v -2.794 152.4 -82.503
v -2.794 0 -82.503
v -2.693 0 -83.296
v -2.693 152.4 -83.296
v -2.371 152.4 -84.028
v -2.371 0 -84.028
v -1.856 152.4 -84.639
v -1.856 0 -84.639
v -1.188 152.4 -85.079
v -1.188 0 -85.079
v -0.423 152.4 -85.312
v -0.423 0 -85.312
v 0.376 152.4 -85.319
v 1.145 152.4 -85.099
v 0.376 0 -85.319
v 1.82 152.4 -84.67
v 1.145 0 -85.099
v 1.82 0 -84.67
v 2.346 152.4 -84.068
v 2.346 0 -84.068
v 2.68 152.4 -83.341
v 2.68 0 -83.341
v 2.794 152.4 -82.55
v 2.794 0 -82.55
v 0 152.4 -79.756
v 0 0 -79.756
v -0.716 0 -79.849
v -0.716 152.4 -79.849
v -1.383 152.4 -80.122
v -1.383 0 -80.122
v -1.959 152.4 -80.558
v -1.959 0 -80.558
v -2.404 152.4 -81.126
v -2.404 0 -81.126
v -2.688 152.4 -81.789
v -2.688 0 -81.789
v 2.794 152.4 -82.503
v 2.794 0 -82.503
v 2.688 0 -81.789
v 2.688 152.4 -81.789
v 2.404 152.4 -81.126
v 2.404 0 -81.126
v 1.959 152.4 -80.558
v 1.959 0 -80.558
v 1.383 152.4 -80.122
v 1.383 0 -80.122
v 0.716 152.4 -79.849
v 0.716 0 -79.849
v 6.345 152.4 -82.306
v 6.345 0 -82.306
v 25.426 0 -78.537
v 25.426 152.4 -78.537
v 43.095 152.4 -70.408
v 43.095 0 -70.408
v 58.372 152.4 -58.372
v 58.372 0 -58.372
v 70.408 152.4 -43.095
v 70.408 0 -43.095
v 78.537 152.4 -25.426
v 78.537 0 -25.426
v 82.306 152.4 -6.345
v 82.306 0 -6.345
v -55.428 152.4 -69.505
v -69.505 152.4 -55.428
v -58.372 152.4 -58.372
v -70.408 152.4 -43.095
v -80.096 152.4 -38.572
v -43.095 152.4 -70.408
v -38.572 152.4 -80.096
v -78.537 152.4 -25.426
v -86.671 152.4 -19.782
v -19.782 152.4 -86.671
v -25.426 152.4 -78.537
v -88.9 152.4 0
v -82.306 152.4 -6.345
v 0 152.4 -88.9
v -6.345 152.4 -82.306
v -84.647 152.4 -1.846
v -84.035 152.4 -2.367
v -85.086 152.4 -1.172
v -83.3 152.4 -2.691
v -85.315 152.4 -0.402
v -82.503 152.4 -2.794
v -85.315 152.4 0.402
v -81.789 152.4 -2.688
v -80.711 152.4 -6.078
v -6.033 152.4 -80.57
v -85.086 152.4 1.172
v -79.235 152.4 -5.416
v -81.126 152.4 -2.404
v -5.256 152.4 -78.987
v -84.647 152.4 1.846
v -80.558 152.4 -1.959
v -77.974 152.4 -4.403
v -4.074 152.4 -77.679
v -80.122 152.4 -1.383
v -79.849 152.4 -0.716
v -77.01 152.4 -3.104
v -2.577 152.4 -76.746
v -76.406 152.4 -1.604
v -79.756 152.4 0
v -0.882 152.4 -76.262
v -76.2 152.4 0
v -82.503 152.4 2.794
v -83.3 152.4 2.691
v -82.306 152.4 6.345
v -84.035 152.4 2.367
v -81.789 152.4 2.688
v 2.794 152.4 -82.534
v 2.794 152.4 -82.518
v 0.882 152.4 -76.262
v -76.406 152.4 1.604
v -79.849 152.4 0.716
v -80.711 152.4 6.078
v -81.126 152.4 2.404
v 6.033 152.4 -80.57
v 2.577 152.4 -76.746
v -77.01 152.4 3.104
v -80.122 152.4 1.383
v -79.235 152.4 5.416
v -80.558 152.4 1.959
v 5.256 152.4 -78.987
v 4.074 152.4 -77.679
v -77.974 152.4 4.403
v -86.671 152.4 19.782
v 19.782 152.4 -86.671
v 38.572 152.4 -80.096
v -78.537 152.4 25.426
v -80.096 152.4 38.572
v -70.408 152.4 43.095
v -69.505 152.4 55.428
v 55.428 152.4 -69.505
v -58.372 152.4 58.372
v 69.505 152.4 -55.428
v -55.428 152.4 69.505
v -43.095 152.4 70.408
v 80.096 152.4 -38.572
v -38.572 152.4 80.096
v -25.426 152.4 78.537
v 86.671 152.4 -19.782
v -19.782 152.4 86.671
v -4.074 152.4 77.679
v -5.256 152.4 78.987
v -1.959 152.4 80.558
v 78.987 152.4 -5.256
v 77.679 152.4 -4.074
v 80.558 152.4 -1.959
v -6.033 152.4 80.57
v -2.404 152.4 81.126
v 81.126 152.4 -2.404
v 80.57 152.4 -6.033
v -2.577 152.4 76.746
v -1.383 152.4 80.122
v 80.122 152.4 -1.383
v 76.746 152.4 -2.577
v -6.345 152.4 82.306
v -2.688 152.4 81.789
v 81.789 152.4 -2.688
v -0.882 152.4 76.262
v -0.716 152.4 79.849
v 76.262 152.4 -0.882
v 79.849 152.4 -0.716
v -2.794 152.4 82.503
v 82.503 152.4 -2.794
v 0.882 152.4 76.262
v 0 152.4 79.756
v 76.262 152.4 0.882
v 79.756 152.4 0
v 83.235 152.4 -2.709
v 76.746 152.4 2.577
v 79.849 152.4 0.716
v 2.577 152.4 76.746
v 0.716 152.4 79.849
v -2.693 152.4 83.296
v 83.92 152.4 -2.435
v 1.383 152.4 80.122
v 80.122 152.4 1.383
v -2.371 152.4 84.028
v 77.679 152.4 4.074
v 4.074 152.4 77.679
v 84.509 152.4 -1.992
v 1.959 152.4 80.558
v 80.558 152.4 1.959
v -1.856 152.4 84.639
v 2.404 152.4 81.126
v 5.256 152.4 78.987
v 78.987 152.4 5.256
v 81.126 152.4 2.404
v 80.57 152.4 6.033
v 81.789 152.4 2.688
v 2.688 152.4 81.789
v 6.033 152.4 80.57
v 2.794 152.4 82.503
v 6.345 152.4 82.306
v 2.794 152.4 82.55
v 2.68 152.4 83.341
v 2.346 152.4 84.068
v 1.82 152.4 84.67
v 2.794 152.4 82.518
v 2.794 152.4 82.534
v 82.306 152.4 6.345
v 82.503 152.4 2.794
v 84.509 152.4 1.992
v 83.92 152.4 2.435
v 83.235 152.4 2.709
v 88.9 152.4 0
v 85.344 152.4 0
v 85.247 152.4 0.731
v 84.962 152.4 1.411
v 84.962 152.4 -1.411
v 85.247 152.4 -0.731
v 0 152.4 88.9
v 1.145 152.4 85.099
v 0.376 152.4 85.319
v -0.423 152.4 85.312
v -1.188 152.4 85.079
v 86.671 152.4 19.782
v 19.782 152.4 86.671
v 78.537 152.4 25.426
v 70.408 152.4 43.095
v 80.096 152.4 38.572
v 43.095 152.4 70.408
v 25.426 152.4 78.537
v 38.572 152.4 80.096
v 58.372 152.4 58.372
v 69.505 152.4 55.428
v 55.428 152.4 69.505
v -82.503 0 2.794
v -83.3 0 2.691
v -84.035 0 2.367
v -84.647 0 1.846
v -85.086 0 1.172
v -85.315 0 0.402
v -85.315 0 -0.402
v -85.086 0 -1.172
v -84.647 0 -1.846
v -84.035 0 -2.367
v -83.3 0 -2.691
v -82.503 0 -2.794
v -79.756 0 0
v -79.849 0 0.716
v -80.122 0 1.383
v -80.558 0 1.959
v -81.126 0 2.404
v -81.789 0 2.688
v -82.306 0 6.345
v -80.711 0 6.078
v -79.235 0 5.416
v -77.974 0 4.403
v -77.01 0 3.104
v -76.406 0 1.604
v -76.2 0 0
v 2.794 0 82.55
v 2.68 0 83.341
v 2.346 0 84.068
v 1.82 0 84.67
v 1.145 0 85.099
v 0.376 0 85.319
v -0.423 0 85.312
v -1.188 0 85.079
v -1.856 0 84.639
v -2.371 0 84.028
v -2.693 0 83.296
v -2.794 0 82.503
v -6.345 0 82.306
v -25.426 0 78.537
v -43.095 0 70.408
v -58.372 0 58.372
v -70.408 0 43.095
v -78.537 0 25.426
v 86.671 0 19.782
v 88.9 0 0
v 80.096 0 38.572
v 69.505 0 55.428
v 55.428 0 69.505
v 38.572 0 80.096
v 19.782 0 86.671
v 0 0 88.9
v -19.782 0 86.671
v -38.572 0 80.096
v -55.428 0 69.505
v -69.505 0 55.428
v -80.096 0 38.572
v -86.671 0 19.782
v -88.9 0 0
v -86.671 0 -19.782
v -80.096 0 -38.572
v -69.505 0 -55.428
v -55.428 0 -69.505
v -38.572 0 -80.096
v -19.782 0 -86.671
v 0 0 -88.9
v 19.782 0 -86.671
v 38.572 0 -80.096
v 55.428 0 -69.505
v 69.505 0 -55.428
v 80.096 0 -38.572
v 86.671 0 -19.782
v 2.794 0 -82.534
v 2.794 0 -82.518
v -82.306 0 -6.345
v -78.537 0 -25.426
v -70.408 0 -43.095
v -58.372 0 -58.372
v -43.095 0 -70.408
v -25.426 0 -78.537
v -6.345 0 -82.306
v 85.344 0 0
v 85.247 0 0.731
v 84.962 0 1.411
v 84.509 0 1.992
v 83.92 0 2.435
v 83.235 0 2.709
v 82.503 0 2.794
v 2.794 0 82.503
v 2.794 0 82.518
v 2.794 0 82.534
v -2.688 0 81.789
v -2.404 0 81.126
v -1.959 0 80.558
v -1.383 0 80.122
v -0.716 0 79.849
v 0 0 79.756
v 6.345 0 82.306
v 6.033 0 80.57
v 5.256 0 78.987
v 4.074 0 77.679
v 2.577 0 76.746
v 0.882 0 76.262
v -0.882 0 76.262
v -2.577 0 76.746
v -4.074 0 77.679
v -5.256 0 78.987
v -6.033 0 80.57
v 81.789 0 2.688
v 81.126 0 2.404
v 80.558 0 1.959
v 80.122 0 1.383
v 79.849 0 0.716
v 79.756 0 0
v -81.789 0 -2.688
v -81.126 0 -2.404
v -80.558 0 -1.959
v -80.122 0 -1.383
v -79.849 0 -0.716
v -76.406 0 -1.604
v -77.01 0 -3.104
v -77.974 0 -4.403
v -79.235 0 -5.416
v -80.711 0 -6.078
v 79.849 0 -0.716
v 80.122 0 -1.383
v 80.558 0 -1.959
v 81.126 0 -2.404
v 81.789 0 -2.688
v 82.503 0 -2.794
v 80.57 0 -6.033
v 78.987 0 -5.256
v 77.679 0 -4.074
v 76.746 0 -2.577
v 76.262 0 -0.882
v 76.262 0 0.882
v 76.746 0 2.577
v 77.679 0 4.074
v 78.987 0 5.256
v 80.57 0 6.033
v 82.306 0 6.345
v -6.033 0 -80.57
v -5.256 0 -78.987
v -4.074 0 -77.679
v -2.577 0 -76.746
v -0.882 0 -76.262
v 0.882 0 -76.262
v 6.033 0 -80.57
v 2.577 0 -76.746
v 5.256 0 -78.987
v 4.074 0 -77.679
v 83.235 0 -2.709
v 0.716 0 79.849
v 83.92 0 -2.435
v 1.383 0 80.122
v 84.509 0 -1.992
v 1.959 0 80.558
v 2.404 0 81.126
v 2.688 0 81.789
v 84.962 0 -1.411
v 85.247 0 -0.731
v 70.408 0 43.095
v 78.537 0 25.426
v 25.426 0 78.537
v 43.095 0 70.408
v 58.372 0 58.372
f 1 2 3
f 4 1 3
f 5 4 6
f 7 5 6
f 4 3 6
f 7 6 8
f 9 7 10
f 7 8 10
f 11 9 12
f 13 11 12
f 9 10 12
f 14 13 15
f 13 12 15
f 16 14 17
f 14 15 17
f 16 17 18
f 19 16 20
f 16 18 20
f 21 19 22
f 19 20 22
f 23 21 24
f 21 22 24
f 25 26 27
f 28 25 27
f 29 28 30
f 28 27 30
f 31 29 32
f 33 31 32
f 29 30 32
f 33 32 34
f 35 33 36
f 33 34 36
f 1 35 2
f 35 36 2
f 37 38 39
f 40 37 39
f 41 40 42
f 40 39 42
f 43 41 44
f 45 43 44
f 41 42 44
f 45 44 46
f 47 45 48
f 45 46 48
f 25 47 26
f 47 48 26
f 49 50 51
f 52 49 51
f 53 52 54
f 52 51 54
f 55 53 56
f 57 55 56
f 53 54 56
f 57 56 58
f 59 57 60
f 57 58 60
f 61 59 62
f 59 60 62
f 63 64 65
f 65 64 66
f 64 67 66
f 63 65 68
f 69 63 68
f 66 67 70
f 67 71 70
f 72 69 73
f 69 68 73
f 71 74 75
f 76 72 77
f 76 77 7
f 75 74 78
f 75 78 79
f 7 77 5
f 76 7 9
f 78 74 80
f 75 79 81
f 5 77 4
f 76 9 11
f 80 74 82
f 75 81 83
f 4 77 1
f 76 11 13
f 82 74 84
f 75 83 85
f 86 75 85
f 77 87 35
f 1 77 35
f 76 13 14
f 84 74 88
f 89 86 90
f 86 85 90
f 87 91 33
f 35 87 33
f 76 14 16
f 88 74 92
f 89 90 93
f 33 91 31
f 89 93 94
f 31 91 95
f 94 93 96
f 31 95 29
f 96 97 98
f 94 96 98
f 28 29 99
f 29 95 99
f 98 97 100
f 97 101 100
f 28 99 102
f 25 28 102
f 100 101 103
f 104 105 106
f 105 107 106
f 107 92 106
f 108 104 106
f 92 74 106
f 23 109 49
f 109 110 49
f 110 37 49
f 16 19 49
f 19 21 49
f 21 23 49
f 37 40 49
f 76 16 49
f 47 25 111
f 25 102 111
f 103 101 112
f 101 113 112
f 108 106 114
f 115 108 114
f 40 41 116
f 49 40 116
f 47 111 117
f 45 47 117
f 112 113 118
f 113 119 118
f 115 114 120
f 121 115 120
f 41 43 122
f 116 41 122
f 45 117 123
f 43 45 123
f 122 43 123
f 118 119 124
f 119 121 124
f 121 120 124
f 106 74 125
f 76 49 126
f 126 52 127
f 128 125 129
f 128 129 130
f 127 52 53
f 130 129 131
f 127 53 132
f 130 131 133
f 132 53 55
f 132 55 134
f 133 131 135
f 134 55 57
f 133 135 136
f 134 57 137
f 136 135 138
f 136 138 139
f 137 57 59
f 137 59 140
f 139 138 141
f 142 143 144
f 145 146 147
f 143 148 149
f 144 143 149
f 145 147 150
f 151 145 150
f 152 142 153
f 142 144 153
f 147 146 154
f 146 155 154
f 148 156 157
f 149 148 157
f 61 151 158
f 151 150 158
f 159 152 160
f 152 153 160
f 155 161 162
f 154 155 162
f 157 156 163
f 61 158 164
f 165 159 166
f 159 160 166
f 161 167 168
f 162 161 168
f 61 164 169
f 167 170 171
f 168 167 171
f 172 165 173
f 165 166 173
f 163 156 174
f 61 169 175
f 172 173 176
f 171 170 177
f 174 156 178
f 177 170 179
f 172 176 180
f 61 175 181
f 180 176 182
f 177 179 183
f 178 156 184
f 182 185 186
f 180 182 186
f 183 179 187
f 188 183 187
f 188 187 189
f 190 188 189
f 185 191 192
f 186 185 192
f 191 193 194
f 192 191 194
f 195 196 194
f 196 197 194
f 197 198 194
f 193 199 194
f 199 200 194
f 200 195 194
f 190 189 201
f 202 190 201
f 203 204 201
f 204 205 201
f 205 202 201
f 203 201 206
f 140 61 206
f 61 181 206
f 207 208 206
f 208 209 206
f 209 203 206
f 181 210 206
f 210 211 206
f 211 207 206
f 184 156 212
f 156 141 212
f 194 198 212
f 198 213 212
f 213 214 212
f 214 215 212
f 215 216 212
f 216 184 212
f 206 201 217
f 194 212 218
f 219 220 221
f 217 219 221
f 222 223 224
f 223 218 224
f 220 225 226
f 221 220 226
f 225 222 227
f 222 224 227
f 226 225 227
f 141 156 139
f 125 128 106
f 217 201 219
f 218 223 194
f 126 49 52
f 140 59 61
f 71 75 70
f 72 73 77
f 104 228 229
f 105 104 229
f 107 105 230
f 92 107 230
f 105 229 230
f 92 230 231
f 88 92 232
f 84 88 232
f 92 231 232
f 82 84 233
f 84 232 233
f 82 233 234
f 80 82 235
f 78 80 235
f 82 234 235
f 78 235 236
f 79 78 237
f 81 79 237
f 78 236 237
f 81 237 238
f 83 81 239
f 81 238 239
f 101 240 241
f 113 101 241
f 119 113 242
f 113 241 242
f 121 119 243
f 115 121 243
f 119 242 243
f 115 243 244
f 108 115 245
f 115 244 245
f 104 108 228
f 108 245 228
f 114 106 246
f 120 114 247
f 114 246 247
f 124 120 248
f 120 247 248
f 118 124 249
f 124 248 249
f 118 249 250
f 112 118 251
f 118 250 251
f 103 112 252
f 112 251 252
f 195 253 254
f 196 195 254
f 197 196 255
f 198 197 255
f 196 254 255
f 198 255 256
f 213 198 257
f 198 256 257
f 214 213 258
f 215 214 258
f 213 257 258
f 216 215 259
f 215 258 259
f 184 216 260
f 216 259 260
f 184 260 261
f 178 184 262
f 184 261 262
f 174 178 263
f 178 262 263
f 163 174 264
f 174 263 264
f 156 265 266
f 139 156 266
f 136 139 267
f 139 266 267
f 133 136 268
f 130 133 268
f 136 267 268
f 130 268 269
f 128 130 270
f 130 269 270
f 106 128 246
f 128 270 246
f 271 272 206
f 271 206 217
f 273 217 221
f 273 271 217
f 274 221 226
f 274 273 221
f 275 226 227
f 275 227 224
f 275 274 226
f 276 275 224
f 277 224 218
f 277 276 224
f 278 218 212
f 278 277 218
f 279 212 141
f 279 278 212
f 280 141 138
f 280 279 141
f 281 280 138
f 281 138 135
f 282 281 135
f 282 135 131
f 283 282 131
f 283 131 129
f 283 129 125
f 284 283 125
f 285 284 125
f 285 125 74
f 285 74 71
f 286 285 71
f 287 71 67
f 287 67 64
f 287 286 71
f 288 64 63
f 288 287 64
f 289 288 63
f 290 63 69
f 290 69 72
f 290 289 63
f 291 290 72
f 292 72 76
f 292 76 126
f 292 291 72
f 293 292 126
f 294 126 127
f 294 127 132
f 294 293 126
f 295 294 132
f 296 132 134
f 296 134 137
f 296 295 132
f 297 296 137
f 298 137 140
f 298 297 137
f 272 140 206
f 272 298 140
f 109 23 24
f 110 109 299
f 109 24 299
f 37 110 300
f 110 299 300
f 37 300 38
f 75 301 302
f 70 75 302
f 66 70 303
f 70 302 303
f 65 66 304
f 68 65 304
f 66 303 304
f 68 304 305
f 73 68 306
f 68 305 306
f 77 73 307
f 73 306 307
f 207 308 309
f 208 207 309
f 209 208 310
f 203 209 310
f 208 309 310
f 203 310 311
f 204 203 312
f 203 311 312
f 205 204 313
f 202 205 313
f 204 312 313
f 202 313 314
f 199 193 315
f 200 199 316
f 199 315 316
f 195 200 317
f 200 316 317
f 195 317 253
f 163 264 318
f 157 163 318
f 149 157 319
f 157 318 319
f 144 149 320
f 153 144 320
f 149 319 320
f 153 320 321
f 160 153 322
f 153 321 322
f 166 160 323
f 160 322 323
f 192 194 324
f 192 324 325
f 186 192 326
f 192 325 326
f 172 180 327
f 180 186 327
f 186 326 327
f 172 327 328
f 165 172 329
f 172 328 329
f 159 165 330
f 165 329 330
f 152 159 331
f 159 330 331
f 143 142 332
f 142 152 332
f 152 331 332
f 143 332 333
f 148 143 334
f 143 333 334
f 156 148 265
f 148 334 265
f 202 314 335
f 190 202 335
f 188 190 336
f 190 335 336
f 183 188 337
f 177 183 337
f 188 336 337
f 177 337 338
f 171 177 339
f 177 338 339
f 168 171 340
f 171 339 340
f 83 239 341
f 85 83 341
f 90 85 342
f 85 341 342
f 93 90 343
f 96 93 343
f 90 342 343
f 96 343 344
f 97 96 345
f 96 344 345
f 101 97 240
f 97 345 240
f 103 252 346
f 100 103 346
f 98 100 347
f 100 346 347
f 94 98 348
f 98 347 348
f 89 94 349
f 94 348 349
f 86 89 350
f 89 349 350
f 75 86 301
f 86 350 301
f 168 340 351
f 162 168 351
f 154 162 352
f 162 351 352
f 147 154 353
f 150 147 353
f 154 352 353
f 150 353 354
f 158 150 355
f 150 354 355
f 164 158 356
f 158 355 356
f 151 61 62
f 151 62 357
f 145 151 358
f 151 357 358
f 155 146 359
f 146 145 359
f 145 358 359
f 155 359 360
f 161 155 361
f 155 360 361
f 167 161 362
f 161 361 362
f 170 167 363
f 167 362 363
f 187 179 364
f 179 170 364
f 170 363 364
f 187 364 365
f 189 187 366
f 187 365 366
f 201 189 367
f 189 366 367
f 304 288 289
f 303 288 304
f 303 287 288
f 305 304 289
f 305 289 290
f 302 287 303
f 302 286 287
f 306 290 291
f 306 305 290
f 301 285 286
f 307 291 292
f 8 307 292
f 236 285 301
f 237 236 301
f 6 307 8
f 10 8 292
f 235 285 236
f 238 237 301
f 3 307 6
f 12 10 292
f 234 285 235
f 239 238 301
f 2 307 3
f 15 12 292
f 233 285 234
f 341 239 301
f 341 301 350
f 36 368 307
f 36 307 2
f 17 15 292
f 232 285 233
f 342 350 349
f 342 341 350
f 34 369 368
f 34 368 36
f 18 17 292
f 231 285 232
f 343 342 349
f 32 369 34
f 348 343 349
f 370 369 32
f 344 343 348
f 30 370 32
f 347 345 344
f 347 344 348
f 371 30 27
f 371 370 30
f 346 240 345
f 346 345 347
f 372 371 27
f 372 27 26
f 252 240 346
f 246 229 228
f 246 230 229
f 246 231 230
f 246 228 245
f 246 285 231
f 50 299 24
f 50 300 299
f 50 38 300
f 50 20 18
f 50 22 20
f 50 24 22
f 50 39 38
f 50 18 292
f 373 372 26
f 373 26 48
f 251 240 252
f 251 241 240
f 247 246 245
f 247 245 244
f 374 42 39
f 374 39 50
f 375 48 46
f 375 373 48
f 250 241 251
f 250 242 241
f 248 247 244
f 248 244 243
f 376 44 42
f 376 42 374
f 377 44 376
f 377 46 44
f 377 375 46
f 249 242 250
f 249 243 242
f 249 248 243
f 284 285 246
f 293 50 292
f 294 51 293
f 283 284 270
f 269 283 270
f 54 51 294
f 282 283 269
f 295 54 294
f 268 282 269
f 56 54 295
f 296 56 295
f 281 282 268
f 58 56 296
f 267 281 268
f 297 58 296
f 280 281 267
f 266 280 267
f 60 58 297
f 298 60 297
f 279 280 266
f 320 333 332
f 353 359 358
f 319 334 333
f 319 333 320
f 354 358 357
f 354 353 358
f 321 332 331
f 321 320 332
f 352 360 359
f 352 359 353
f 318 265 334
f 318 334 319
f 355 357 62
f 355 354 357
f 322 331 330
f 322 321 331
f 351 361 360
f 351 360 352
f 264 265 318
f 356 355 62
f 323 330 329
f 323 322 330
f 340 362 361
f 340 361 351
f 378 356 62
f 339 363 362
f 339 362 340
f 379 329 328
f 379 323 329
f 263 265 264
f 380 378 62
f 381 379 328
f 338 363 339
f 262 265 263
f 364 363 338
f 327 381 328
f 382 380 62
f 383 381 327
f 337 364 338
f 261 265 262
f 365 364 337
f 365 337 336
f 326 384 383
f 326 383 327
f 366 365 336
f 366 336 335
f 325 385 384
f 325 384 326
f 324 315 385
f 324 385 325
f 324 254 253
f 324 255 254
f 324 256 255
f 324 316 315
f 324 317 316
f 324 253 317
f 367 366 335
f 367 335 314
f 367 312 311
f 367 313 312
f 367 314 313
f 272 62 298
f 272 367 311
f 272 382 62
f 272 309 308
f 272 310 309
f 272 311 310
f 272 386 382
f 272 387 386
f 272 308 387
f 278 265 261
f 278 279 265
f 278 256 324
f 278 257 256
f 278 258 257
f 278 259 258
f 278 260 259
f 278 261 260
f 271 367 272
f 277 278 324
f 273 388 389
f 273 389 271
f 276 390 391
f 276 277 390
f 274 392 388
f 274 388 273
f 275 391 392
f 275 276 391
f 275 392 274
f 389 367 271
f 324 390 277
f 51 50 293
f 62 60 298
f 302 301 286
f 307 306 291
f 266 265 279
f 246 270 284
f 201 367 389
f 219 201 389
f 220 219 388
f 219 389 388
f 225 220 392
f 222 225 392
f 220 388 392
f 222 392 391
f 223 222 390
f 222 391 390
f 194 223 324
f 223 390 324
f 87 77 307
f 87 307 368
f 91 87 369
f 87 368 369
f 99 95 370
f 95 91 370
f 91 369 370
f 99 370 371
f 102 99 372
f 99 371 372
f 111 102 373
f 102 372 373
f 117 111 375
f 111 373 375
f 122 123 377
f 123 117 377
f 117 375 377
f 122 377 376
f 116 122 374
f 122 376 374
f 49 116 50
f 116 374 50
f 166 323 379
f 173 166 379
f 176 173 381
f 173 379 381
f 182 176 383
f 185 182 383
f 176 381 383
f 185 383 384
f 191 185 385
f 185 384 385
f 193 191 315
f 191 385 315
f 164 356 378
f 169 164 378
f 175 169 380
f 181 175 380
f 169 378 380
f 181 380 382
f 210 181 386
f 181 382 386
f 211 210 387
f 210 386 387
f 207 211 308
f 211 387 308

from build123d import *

# Parameters (mm, degrees)
F0_R     = 88.9
F1_DEPTH = 152.4
F4_DEPTH = 152.401
F5_DEPTH = 152.401


with BuildPart() as f1:
    # F0 (on Front) → F1 (new body)
    with BuildSketch(Plane.XZ):
        Circle(F0_R)
    extrude(amount=-F1_DEPTH)

    # F3 (on face) → F4 (cut, through all)
    with BuildSketch(Plane.XZ):
        with BuildLine():
            ThreePointArc((6.345302, 82.305769), (0, 76.2), (-6.345302, 82.305769))
            ThreePointArc((-6.345302, 82.305769), (-58.371665, 58.371665), (-82.305769, 6.345302))
            ThreePointArc((-82.305769, 6.345302), (-77.974338, 4.402933), (-76.2, 0))
            ThreePointArc((-76.2, 0), (-77.974338, -4.402933), (-82.305769, -6.345302))
            ThreePointArc((-82.305769, -6.345302), (-58.371665, -58.371665), (-6.345302, -82.305769))
            ThreePointArc((-6.345302, -82.305769), (0, -76.2), (6.345302, -82.305769))
            ThreePointArc((6.345302, -82.305769), (58.371665, -58.371665), (82.305769, -6.345302))
            ThreePointArc((82.305769, -6.345302), (76.2, 0), (82.305769, 6.345302))
            ThreePointArc((82.305769, 6.345302), (58.371665, 58.371665), (6.345302, 82.305769))
        make_face()
    extrude(amount=-F4_DEPTH, mode=Mode.SUBTRACT)

    # F2 (on face) → F5 (cut, through all)
    with BuildSketch(Plane.XZ):
        with BuildLine():
            ThreePointArc((-2.7936, 82.502717), (-1.958868, 80.557697), (0, 79.756))
            ThreePointArc((0, 79.756), (1.958868, 80.557697), (2.7936, 82.502717))
            ThreePointArc((2.7936, 82.502717), (2.7939, 82.526358), (2.794, 82.55))
            ThreePointArc((2.794, 82.55), (-0.023642, 85.3439), (-2.7936, 82.502717))
        make_face()
        with BuildLine():
            ThreePointArc((-82.502717, 2.7936), (-85.344, 0), (-82.502717, -2.7936))
            ThreePointArc((-82.502717, -2.7936), (-80.557697, -1.958868), (-79.756, 0))
            ThreePointArc((-79.756, 0), (-80.557697, 1.958868), (-82.502717, 2.7936))
        make_face()
        with BuildLine():
            ThreePointArc((79.756, 0), (80.557697, -1.958868), (82.502717, -2.7936))
            ThreePointArc((82.502717, -2.7936), (84.508868, -1.992303), (85.344, 0))
            ThreePointArc((85.344, 0), (84.508868, 1.992303), (82.502717, 2.7936))
            ThreePointArc((82.502717, 2.7936), (80.557697, 1.958868), (79.756, 0))
        make_face()
        with BuildLine():
            ThreePointArc((2.794, -82.55), (2.7939, -82.526358), (2.7936, -82.502717))
            ThreePointArc((2.7936, -82.502717), (1.958868, -80.557697), (0, -79.756))
            ThreePointArc((0, -79.756), (-1.958868, -80.557697), (-2.7936, -82.502717))
            ThreePointArc((-2.7936, -82.502717), (-0.023642, -85.3439), (2.794, -82.55))
        make_face()
    extrude(amount=-F5_DEPTH, mode=Mode.SUBTRACT)


solid = f1.part
